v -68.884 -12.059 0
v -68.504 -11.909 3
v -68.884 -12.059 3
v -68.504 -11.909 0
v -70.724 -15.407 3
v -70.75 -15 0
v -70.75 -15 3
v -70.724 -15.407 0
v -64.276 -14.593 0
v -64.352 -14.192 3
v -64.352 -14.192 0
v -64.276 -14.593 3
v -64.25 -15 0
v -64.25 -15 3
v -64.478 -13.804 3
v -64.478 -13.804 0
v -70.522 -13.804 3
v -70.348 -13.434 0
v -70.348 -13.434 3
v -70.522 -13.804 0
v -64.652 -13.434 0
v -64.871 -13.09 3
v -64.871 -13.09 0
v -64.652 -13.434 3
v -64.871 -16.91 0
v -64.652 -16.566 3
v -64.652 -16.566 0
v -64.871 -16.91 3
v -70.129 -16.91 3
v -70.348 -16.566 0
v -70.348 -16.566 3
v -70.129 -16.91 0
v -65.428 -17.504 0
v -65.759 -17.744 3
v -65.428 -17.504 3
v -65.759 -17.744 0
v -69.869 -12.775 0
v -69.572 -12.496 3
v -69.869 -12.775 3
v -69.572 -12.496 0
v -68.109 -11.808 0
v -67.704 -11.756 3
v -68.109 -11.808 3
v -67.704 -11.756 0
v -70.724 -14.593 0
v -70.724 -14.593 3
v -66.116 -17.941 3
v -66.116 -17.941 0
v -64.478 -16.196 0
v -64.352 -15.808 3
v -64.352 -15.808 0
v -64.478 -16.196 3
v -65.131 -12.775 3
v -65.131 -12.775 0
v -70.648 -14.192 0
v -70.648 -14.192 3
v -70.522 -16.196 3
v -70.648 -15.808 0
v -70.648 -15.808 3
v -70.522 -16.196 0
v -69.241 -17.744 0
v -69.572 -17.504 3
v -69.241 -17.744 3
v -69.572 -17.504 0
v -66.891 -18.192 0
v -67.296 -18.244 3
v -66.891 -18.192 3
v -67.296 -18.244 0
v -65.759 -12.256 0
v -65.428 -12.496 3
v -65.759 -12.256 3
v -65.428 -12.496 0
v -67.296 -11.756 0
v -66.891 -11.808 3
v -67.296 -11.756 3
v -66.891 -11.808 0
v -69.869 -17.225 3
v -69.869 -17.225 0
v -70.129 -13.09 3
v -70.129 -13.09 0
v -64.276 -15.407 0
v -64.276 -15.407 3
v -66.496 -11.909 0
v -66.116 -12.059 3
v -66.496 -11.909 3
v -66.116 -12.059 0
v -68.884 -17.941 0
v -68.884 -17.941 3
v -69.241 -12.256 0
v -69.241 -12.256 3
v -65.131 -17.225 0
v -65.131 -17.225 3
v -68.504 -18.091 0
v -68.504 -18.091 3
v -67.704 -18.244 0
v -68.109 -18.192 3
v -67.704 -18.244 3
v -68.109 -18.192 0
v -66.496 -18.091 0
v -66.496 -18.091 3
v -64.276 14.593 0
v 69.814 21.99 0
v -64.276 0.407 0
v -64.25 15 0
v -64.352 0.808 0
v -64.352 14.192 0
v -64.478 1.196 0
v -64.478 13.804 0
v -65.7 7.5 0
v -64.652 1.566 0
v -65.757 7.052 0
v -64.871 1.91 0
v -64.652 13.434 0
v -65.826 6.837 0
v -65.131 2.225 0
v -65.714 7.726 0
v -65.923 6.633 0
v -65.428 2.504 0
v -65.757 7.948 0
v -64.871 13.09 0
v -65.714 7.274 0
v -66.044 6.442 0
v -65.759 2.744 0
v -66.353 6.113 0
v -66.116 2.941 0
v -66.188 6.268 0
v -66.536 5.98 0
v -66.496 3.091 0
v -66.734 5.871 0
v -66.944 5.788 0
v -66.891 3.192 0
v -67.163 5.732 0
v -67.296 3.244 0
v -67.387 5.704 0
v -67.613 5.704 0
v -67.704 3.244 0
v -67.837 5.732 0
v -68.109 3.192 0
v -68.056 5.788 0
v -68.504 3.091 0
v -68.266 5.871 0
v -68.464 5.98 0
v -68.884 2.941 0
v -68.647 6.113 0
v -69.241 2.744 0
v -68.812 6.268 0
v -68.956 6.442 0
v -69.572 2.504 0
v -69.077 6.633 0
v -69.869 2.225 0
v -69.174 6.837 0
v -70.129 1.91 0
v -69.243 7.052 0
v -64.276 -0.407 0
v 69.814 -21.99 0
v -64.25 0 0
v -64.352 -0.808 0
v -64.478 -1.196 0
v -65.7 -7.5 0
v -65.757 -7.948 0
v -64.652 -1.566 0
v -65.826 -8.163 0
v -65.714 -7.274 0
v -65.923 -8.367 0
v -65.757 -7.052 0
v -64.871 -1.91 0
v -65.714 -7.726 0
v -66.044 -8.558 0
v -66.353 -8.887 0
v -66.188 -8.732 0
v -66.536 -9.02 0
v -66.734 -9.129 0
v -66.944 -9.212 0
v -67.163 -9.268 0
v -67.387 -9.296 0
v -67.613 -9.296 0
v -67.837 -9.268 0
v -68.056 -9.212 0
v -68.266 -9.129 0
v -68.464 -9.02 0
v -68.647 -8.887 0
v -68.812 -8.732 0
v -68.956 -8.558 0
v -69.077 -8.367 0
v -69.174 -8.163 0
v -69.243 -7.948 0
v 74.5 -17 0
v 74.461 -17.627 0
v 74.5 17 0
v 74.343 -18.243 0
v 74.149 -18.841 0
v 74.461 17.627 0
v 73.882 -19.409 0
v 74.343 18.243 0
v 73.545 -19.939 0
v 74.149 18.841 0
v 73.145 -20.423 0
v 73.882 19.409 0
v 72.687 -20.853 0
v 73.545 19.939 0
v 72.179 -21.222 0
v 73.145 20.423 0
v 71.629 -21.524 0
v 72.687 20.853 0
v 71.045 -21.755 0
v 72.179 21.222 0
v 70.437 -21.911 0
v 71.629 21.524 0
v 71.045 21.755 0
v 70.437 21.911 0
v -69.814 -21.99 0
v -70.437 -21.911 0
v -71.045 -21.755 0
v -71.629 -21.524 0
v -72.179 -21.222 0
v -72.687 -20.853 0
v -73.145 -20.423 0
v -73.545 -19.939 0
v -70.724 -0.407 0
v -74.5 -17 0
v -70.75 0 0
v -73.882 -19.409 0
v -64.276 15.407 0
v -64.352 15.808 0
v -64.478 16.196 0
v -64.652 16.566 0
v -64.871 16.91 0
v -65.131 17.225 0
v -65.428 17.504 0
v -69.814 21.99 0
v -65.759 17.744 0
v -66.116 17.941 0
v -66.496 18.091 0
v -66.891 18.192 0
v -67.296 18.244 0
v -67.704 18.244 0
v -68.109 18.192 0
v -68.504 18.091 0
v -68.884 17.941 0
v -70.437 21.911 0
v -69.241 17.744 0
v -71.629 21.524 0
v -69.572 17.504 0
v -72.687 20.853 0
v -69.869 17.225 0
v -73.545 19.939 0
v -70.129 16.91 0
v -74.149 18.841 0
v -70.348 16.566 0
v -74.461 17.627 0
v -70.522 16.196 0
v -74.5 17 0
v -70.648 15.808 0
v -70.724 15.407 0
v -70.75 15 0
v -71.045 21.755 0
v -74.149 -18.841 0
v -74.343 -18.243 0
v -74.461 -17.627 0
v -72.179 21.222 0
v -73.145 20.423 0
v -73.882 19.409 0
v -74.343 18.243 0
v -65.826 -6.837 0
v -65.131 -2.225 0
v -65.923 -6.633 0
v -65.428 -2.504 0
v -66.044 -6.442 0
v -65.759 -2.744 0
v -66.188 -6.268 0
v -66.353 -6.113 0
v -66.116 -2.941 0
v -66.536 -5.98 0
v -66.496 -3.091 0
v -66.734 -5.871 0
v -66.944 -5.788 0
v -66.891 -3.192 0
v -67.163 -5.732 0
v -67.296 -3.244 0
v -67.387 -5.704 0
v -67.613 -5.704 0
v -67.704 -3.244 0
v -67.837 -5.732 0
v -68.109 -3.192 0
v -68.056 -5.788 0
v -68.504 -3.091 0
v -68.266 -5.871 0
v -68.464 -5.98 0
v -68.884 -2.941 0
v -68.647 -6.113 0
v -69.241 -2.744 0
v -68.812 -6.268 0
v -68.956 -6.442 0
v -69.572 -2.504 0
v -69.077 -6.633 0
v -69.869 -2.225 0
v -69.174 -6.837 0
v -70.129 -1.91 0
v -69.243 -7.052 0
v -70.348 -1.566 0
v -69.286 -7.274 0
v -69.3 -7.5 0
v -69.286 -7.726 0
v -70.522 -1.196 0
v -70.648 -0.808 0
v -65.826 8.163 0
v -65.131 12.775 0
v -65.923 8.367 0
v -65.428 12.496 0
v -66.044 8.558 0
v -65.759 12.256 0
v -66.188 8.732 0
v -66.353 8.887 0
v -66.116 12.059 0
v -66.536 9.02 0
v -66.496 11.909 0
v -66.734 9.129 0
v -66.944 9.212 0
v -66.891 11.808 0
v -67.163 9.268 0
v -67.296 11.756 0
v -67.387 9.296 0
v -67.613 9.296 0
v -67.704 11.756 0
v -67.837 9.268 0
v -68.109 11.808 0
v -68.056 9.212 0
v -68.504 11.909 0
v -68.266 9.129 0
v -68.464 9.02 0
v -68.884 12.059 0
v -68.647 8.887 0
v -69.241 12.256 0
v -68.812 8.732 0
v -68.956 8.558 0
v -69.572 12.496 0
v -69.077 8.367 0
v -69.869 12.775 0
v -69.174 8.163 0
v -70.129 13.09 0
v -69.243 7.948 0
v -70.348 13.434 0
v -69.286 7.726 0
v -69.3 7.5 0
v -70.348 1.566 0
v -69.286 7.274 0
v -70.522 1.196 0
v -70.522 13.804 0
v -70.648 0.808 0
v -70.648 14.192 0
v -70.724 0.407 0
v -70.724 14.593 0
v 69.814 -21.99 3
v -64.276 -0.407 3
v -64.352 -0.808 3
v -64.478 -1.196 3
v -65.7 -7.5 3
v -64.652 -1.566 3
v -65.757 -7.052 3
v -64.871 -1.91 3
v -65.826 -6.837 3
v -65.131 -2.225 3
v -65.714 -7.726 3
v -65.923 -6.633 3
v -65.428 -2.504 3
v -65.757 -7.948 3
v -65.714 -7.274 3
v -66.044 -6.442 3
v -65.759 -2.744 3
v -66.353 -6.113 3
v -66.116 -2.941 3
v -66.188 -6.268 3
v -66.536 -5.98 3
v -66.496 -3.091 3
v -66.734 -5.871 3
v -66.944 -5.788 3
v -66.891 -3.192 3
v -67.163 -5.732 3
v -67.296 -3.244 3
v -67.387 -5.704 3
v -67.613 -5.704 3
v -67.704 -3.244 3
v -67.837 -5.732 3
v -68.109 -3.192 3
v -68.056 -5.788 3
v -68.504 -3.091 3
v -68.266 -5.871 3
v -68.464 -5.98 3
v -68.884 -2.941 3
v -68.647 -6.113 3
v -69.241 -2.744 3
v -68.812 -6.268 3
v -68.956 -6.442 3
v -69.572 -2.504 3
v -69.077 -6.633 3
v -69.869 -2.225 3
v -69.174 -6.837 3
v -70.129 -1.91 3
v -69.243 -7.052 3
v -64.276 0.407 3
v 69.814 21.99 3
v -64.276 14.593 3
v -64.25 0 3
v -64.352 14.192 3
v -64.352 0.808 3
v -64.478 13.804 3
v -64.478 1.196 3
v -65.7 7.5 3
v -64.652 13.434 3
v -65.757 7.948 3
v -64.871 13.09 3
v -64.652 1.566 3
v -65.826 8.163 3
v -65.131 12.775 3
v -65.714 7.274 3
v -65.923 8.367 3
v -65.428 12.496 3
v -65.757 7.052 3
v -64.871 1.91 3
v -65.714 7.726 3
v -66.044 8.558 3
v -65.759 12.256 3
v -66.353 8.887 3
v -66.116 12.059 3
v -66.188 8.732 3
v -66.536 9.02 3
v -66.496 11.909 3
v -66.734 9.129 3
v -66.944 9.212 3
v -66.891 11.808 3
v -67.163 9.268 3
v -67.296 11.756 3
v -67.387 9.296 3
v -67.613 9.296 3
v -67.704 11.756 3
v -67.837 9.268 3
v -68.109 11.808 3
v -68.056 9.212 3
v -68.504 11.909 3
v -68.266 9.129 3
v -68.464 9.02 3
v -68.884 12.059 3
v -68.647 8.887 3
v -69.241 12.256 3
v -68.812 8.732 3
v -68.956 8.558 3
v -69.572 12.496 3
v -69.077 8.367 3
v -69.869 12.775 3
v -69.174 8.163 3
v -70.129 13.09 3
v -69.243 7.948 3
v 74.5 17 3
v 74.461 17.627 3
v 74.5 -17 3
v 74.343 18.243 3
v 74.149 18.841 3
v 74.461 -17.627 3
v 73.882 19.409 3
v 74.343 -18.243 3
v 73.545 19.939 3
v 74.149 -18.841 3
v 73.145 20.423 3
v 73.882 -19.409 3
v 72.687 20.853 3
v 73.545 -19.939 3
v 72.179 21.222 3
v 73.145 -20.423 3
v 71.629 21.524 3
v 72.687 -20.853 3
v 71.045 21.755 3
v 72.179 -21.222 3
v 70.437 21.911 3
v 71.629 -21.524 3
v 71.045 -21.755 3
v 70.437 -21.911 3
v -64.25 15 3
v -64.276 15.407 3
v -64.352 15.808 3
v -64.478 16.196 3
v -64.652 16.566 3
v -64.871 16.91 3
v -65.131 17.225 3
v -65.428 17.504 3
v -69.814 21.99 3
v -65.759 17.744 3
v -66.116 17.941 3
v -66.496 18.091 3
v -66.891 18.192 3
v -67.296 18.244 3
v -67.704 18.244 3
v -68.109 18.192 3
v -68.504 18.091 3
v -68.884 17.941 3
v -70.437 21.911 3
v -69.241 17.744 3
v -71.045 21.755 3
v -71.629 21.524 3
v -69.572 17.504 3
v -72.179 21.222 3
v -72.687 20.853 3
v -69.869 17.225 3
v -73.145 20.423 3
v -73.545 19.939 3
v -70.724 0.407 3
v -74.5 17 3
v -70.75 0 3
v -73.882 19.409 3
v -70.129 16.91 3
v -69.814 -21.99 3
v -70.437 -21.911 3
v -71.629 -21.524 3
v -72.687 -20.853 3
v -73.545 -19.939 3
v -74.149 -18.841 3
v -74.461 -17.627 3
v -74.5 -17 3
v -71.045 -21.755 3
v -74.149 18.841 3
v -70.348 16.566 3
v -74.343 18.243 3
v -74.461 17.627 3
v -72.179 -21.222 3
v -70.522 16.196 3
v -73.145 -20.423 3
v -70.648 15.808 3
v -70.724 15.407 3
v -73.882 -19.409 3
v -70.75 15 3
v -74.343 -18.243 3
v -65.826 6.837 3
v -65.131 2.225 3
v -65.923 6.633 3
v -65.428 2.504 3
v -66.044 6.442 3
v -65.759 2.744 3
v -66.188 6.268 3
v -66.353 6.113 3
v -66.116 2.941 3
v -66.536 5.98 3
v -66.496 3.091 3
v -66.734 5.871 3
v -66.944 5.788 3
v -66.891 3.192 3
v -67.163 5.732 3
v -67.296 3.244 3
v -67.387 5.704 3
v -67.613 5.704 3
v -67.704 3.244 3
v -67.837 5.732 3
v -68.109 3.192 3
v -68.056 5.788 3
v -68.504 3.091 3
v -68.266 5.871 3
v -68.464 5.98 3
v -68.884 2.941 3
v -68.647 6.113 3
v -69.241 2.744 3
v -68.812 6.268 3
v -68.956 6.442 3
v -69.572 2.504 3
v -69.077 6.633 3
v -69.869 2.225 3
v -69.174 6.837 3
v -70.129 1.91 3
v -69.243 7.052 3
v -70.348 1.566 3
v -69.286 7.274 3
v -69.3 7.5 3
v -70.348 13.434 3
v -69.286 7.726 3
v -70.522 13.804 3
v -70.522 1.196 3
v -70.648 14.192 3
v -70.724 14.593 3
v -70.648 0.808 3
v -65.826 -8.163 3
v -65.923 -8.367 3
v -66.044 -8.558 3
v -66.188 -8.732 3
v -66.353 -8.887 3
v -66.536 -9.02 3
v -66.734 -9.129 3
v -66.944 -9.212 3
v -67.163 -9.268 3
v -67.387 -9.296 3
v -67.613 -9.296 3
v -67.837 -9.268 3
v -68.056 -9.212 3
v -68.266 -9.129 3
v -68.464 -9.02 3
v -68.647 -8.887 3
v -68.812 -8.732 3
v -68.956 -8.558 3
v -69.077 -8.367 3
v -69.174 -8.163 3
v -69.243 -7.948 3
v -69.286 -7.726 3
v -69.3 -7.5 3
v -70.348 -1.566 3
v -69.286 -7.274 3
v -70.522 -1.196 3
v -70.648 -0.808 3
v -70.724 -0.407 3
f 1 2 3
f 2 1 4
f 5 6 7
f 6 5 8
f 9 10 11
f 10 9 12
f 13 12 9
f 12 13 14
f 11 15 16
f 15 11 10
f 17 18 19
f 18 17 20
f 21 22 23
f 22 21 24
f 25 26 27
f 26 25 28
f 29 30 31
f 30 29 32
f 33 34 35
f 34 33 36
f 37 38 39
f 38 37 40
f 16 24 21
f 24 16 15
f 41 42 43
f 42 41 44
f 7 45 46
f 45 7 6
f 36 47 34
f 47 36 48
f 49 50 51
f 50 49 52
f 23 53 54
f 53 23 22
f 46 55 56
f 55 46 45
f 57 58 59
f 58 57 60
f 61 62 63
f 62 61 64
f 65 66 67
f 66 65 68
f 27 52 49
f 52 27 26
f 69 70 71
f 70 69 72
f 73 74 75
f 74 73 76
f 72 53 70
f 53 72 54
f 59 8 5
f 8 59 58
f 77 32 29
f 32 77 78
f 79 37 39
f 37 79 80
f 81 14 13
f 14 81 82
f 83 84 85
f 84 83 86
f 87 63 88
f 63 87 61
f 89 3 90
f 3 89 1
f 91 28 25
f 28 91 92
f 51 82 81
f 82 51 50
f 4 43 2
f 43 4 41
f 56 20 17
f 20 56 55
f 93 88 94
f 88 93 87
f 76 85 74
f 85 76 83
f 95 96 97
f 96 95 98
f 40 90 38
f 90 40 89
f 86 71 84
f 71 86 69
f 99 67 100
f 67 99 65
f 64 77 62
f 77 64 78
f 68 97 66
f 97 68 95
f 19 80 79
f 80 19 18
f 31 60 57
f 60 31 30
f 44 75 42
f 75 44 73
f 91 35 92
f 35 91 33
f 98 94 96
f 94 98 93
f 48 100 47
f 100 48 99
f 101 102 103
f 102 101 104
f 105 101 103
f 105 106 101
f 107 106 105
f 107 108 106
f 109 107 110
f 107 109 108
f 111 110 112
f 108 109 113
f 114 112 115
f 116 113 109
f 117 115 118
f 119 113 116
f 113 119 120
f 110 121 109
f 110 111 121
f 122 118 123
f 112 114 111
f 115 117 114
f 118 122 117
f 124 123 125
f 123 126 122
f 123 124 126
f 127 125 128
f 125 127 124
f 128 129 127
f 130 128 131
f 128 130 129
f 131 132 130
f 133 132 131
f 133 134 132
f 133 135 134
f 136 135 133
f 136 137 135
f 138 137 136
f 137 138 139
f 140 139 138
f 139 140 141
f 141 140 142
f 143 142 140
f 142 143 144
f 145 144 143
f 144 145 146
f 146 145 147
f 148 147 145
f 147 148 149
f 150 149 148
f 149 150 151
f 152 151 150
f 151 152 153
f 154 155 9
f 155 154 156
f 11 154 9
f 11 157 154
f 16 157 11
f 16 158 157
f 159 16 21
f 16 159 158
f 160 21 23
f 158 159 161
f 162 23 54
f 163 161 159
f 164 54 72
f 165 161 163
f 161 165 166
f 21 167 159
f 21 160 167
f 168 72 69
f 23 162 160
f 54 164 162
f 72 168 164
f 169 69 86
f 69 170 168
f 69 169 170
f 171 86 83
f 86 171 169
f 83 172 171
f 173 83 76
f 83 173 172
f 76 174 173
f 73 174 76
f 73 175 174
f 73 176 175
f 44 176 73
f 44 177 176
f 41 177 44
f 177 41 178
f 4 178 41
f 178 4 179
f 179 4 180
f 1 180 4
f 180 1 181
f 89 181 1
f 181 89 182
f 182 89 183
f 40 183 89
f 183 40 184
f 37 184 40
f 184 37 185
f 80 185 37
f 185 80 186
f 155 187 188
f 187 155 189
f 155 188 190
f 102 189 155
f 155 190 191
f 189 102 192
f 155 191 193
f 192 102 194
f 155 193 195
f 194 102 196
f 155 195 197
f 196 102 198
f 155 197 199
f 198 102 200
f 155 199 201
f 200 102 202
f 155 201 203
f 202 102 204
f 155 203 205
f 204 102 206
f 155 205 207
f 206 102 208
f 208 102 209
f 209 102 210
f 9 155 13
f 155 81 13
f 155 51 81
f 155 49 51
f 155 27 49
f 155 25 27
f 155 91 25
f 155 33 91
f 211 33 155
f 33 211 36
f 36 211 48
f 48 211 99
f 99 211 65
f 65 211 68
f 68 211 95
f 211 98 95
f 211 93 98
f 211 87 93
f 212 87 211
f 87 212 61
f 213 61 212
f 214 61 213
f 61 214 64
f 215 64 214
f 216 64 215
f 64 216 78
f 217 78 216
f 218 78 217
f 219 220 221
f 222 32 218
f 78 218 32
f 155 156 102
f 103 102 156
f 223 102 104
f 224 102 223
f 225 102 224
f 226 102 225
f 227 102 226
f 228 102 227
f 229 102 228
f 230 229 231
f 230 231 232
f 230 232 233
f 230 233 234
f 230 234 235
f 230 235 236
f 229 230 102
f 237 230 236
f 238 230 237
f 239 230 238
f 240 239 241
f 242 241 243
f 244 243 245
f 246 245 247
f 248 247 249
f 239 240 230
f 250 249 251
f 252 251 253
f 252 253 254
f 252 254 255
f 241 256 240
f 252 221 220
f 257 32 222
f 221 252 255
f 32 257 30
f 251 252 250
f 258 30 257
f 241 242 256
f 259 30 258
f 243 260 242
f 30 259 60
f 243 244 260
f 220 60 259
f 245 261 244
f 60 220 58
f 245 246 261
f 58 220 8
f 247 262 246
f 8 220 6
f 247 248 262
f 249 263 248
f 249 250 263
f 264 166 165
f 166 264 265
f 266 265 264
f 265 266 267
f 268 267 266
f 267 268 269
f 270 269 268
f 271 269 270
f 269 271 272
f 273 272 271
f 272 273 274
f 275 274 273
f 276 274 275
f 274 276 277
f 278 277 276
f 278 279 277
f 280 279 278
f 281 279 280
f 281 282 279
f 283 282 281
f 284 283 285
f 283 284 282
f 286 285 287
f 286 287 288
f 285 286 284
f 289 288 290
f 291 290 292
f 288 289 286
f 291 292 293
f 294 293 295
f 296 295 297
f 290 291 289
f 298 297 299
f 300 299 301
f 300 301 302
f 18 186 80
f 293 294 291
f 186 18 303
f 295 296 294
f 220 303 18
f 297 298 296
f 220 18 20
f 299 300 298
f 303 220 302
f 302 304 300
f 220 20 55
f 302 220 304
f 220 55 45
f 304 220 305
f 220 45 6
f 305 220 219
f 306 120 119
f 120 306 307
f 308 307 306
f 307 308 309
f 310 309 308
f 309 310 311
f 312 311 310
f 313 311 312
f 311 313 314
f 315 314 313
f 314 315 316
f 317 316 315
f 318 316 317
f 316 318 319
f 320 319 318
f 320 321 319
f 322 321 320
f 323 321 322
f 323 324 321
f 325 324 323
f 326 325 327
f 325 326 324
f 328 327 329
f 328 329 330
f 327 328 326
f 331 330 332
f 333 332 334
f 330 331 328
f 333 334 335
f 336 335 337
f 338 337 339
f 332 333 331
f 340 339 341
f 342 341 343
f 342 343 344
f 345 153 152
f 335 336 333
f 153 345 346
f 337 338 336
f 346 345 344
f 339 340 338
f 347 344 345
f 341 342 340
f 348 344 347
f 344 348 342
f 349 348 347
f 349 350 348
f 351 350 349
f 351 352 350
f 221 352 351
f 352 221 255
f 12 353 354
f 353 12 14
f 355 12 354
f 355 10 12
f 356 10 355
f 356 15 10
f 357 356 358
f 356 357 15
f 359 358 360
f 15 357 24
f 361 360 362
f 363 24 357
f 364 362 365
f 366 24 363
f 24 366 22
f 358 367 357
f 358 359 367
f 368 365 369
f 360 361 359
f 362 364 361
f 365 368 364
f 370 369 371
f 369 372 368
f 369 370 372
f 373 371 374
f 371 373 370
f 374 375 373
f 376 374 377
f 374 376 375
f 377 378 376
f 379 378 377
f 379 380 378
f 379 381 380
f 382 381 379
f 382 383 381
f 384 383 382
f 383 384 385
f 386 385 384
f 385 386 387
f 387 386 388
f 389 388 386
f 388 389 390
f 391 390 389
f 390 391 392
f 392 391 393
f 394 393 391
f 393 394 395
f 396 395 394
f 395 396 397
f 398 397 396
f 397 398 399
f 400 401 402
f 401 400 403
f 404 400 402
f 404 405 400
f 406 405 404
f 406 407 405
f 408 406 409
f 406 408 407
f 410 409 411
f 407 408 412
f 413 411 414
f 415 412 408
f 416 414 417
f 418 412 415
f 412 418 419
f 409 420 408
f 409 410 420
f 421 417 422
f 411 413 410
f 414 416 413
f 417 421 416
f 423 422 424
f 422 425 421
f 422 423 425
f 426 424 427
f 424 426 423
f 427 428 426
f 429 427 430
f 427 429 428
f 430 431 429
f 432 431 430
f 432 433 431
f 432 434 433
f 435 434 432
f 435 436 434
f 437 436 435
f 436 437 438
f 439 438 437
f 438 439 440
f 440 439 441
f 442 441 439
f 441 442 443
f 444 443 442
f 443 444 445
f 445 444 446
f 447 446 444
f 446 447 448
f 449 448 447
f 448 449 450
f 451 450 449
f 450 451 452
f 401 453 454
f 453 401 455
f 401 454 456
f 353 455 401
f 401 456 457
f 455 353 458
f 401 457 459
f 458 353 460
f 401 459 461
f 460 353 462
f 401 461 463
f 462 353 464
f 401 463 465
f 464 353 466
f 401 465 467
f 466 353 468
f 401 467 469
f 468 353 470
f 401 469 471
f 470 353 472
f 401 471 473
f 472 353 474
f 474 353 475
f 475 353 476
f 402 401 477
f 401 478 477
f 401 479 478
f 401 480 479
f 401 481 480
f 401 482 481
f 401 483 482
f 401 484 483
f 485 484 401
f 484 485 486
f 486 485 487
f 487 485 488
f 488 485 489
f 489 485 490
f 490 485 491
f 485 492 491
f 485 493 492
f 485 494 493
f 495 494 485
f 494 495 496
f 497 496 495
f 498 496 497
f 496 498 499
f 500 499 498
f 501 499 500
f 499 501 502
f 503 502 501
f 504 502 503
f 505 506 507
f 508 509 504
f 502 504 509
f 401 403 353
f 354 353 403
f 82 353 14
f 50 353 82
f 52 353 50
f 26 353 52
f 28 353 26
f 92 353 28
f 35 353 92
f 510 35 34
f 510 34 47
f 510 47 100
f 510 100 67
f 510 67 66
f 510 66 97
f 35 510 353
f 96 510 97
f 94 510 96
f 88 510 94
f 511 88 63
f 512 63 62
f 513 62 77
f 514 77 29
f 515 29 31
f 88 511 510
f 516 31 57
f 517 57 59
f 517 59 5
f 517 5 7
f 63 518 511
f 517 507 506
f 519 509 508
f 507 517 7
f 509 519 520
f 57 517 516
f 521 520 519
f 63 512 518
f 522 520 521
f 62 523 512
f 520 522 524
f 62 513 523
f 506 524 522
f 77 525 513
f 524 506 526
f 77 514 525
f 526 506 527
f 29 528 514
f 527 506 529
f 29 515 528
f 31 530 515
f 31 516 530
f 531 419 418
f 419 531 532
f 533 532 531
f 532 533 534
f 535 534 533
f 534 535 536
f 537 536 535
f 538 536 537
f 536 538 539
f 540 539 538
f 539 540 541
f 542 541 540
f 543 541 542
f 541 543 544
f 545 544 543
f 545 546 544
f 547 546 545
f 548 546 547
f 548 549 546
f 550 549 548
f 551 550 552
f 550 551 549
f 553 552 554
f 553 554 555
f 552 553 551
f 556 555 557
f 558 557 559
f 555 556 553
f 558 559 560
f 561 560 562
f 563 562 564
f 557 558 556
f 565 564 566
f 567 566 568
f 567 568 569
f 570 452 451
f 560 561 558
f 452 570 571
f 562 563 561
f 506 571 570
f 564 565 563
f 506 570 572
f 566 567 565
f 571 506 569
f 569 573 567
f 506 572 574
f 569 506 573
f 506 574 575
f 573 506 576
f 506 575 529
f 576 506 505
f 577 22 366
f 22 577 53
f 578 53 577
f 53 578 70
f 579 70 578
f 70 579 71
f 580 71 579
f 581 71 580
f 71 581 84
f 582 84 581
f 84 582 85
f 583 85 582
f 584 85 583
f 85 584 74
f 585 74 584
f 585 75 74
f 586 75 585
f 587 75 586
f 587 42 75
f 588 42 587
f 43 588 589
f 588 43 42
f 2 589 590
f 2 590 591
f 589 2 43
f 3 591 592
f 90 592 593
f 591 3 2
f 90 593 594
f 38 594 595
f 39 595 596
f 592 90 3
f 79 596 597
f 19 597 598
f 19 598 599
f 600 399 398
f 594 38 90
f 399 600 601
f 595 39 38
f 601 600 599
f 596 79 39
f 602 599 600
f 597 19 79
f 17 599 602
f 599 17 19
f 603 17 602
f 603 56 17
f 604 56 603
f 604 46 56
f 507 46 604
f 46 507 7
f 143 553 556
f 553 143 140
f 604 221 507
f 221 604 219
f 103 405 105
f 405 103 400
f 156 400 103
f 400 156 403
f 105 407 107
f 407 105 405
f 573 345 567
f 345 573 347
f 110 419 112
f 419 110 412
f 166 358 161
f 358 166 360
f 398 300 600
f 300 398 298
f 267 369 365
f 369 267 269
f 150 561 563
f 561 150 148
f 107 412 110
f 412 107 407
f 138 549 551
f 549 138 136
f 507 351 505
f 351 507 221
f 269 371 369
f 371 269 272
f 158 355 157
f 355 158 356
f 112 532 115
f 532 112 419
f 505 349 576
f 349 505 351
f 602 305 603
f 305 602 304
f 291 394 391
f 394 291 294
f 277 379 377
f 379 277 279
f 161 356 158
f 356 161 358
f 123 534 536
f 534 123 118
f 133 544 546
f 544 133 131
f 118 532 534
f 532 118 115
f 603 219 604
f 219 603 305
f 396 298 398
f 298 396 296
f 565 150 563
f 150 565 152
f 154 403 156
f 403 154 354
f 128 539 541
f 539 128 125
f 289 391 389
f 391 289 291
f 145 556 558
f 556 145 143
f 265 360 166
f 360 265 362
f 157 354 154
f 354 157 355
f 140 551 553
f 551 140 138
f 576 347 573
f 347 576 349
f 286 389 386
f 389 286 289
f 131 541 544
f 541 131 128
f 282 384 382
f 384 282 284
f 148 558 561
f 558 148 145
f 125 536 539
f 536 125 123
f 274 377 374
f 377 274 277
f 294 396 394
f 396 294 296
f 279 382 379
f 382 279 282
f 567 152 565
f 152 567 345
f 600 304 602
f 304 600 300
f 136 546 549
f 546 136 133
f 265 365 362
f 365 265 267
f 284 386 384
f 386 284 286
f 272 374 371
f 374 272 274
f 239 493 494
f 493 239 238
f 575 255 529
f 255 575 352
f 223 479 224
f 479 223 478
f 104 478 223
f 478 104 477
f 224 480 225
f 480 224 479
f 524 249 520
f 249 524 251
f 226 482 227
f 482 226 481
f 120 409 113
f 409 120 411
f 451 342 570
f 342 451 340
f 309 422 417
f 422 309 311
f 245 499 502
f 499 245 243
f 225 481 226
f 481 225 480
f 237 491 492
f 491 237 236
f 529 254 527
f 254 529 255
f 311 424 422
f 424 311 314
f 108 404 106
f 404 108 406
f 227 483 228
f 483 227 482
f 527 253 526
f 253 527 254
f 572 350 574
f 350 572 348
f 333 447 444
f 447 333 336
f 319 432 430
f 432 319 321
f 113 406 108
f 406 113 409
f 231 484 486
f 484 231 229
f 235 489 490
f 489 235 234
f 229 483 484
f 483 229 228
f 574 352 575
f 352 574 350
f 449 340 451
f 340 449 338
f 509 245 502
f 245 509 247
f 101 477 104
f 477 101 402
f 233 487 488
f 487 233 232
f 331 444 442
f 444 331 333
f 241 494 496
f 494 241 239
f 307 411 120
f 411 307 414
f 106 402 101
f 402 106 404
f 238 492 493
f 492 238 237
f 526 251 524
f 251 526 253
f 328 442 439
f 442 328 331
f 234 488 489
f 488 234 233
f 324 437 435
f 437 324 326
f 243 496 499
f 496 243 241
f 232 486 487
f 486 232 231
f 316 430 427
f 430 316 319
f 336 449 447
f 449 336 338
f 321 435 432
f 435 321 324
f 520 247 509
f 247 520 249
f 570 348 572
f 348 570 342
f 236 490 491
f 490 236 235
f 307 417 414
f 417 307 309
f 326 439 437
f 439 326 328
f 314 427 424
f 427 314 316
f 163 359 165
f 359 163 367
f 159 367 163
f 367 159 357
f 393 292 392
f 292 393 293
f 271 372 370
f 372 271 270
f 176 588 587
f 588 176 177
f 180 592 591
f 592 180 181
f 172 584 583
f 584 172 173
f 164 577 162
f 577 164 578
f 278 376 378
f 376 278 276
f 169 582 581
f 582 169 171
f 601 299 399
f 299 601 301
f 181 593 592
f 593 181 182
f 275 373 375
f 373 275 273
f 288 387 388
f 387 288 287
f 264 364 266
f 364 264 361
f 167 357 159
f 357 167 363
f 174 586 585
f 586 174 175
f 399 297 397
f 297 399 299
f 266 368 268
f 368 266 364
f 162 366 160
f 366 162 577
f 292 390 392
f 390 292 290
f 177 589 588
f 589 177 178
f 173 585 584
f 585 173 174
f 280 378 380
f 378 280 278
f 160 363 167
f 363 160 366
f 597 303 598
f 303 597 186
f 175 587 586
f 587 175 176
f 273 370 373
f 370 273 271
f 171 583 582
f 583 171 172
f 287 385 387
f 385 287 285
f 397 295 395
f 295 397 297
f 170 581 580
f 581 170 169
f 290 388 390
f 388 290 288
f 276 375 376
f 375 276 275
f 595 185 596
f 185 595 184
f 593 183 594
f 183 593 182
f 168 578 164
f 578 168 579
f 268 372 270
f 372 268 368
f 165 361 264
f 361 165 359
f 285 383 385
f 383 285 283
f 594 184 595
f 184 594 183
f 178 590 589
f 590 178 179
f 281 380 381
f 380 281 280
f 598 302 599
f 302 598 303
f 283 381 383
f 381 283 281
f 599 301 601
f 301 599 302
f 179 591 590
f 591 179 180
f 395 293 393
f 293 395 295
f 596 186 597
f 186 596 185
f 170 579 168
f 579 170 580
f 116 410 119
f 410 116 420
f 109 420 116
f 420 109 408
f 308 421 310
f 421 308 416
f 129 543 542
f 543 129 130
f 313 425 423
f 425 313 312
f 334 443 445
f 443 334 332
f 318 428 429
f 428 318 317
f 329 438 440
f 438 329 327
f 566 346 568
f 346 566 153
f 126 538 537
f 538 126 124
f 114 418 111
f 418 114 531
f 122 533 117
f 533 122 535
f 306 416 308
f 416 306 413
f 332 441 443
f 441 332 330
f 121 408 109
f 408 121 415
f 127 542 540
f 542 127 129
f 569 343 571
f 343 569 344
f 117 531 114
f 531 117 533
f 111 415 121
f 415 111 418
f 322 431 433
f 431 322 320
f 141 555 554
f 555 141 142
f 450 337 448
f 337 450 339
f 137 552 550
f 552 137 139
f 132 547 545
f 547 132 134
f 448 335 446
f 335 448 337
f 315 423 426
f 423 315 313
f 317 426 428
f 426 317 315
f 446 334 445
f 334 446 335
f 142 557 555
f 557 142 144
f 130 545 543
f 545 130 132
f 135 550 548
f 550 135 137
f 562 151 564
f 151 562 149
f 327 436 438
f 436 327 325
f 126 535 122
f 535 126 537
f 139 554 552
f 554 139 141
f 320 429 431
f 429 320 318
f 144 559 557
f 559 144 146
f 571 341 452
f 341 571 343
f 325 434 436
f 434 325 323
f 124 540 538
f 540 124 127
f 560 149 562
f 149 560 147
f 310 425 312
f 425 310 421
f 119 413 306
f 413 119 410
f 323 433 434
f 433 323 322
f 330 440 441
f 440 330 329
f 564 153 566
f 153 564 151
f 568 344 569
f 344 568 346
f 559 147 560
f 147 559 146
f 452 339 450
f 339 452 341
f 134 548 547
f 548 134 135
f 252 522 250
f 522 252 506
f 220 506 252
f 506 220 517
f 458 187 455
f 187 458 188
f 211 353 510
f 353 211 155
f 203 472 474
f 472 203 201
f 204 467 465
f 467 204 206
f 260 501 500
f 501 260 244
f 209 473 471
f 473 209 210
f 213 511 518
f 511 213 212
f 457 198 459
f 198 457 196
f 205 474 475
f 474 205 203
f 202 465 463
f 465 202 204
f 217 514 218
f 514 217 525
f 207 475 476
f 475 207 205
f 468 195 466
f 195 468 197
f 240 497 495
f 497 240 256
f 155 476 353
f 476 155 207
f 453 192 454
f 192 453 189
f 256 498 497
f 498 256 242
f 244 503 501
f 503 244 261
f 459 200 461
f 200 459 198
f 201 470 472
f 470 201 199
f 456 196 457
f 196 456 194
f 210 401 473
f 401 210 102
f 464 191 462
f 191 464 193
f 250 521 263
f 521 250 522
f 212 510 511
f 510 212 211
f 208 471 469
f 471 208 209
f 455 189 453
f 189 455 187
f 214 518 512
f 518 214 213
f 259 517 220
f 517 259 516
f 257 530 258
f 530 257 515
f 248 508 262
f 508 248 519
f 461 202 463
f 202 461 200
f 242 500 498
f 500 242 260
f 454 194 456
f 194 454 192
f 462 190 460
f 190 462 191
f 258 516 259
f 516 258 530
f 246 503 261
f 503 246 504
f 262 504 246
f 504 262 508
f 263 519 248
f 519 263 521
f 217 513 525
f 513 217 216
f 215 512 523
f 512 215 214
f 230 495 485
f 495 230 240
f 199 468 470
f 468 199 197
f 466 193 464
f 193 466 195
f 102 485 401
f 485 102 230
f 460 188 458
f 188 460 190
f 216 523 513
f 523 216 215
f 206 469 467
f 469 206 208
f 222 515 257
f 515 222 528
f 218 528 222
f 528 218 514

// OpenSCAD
$fn = 50;


difference() {
	union() {
		hull() {
			translate(v = [-69.5000000000, 17.0000000000, 0]) {
				cylinder(h = 3, r = 5);
			}
			translate(v = [69.5000000000, 17.0000000000, 0]) {
				cylinder(h = 3, r = 5);
			}
			translate(v = [-69.5000000000, -17.0000000000, 0]) {
				cylinder(h = 3, r = 5);
			}
			translate(v = [69.5000000000, -17.0000000000, 0]) {
				cylinder(h = 3, r = 5);
			}
		}
	}
	union() {
		translate(v = [-67.5000000000, -15.0000000000, 0]) {
			cylinder(h = 3, r = 3.2500000000);
		}
		translate(v = [-67.5000000000, 0.0000000000, 0]) {
			cylinder(h = 3, r = 3.2500000000);
		}
		translate(v = [-67.5000000000, 15.0000000000, 0]) {
			cylinder(h = 3, r = 3.2500000000);
		}
		translate(v = [-67.5000000000, -15.0000000000, 0]) {
			cylinder(h = 3, r = 1.8000000000);
		}
		translate(v = [-67.5000000000, -7.5000000000, 0]) {
			cylinder(h = 3, r = 1.8000000000);
		}
		translate(v = [-67.5000000000, 0.0000000000, 0]) {
			cylinder(h = 3, r = 1.8000000000);
		}
		translate(v = [-67.5000000000, 7.5000000000, 0]) {
			cylinder(h = 3, r = 1.8000000000);
		}
		translate(v = [-67.5000000000, 15.0000000000, 0]) {
			cylinder(h = 3, r = 1.8000000000);
		}
		translate(v = [-67.5000000000, -15.0000000000, 0]) {
			cylinder(h = 3, r = 1.8000000000);
		}
		translate(v = [-67.5000000000, -7.5000000000, 0]) {
			cylinder(h = 3, r = 1.8000000000);
		}
		translate(v = [-67.5000000000, 0.0000000000, 0]) {
			cylinder(h = 3, r = 1.8000000000);
		}
		translate(v = [-67.5000000000, 7.5000000000, 0]) {
			cylinder(h = 3, r = 1.8000000000);
		}
		translate(v = [-67.5000000000, 15.0000000000, 0]) {
			cylinder(h = 3, r = 1.8000000000);
		}
		translate(v = [-67.5000000000, -15.0000000000, 0]) {
			cylinder(h = 3, r = 1.8000000000);
		}
		translate(v = [-67.5000000000, -7.5000000000, 0]) {
			cylinder(h = 3, r = 1.8000000000);
		}
		translate(v = [-67.5000000000, 0.0000000000, 0]) {
			cylinder(h = 3, r = 1.8000000000);
		}
		translate(v = [-67.5000000000, 7.5000000000, 0]) {
			cylinder(h = 3, r = 1.8000000000);
		}
		translate(v = [-67.5000000000, 15.0000000000, 0]) {
			cylinder(h = 3, r = 1.8000000000);
		}
	}
}
